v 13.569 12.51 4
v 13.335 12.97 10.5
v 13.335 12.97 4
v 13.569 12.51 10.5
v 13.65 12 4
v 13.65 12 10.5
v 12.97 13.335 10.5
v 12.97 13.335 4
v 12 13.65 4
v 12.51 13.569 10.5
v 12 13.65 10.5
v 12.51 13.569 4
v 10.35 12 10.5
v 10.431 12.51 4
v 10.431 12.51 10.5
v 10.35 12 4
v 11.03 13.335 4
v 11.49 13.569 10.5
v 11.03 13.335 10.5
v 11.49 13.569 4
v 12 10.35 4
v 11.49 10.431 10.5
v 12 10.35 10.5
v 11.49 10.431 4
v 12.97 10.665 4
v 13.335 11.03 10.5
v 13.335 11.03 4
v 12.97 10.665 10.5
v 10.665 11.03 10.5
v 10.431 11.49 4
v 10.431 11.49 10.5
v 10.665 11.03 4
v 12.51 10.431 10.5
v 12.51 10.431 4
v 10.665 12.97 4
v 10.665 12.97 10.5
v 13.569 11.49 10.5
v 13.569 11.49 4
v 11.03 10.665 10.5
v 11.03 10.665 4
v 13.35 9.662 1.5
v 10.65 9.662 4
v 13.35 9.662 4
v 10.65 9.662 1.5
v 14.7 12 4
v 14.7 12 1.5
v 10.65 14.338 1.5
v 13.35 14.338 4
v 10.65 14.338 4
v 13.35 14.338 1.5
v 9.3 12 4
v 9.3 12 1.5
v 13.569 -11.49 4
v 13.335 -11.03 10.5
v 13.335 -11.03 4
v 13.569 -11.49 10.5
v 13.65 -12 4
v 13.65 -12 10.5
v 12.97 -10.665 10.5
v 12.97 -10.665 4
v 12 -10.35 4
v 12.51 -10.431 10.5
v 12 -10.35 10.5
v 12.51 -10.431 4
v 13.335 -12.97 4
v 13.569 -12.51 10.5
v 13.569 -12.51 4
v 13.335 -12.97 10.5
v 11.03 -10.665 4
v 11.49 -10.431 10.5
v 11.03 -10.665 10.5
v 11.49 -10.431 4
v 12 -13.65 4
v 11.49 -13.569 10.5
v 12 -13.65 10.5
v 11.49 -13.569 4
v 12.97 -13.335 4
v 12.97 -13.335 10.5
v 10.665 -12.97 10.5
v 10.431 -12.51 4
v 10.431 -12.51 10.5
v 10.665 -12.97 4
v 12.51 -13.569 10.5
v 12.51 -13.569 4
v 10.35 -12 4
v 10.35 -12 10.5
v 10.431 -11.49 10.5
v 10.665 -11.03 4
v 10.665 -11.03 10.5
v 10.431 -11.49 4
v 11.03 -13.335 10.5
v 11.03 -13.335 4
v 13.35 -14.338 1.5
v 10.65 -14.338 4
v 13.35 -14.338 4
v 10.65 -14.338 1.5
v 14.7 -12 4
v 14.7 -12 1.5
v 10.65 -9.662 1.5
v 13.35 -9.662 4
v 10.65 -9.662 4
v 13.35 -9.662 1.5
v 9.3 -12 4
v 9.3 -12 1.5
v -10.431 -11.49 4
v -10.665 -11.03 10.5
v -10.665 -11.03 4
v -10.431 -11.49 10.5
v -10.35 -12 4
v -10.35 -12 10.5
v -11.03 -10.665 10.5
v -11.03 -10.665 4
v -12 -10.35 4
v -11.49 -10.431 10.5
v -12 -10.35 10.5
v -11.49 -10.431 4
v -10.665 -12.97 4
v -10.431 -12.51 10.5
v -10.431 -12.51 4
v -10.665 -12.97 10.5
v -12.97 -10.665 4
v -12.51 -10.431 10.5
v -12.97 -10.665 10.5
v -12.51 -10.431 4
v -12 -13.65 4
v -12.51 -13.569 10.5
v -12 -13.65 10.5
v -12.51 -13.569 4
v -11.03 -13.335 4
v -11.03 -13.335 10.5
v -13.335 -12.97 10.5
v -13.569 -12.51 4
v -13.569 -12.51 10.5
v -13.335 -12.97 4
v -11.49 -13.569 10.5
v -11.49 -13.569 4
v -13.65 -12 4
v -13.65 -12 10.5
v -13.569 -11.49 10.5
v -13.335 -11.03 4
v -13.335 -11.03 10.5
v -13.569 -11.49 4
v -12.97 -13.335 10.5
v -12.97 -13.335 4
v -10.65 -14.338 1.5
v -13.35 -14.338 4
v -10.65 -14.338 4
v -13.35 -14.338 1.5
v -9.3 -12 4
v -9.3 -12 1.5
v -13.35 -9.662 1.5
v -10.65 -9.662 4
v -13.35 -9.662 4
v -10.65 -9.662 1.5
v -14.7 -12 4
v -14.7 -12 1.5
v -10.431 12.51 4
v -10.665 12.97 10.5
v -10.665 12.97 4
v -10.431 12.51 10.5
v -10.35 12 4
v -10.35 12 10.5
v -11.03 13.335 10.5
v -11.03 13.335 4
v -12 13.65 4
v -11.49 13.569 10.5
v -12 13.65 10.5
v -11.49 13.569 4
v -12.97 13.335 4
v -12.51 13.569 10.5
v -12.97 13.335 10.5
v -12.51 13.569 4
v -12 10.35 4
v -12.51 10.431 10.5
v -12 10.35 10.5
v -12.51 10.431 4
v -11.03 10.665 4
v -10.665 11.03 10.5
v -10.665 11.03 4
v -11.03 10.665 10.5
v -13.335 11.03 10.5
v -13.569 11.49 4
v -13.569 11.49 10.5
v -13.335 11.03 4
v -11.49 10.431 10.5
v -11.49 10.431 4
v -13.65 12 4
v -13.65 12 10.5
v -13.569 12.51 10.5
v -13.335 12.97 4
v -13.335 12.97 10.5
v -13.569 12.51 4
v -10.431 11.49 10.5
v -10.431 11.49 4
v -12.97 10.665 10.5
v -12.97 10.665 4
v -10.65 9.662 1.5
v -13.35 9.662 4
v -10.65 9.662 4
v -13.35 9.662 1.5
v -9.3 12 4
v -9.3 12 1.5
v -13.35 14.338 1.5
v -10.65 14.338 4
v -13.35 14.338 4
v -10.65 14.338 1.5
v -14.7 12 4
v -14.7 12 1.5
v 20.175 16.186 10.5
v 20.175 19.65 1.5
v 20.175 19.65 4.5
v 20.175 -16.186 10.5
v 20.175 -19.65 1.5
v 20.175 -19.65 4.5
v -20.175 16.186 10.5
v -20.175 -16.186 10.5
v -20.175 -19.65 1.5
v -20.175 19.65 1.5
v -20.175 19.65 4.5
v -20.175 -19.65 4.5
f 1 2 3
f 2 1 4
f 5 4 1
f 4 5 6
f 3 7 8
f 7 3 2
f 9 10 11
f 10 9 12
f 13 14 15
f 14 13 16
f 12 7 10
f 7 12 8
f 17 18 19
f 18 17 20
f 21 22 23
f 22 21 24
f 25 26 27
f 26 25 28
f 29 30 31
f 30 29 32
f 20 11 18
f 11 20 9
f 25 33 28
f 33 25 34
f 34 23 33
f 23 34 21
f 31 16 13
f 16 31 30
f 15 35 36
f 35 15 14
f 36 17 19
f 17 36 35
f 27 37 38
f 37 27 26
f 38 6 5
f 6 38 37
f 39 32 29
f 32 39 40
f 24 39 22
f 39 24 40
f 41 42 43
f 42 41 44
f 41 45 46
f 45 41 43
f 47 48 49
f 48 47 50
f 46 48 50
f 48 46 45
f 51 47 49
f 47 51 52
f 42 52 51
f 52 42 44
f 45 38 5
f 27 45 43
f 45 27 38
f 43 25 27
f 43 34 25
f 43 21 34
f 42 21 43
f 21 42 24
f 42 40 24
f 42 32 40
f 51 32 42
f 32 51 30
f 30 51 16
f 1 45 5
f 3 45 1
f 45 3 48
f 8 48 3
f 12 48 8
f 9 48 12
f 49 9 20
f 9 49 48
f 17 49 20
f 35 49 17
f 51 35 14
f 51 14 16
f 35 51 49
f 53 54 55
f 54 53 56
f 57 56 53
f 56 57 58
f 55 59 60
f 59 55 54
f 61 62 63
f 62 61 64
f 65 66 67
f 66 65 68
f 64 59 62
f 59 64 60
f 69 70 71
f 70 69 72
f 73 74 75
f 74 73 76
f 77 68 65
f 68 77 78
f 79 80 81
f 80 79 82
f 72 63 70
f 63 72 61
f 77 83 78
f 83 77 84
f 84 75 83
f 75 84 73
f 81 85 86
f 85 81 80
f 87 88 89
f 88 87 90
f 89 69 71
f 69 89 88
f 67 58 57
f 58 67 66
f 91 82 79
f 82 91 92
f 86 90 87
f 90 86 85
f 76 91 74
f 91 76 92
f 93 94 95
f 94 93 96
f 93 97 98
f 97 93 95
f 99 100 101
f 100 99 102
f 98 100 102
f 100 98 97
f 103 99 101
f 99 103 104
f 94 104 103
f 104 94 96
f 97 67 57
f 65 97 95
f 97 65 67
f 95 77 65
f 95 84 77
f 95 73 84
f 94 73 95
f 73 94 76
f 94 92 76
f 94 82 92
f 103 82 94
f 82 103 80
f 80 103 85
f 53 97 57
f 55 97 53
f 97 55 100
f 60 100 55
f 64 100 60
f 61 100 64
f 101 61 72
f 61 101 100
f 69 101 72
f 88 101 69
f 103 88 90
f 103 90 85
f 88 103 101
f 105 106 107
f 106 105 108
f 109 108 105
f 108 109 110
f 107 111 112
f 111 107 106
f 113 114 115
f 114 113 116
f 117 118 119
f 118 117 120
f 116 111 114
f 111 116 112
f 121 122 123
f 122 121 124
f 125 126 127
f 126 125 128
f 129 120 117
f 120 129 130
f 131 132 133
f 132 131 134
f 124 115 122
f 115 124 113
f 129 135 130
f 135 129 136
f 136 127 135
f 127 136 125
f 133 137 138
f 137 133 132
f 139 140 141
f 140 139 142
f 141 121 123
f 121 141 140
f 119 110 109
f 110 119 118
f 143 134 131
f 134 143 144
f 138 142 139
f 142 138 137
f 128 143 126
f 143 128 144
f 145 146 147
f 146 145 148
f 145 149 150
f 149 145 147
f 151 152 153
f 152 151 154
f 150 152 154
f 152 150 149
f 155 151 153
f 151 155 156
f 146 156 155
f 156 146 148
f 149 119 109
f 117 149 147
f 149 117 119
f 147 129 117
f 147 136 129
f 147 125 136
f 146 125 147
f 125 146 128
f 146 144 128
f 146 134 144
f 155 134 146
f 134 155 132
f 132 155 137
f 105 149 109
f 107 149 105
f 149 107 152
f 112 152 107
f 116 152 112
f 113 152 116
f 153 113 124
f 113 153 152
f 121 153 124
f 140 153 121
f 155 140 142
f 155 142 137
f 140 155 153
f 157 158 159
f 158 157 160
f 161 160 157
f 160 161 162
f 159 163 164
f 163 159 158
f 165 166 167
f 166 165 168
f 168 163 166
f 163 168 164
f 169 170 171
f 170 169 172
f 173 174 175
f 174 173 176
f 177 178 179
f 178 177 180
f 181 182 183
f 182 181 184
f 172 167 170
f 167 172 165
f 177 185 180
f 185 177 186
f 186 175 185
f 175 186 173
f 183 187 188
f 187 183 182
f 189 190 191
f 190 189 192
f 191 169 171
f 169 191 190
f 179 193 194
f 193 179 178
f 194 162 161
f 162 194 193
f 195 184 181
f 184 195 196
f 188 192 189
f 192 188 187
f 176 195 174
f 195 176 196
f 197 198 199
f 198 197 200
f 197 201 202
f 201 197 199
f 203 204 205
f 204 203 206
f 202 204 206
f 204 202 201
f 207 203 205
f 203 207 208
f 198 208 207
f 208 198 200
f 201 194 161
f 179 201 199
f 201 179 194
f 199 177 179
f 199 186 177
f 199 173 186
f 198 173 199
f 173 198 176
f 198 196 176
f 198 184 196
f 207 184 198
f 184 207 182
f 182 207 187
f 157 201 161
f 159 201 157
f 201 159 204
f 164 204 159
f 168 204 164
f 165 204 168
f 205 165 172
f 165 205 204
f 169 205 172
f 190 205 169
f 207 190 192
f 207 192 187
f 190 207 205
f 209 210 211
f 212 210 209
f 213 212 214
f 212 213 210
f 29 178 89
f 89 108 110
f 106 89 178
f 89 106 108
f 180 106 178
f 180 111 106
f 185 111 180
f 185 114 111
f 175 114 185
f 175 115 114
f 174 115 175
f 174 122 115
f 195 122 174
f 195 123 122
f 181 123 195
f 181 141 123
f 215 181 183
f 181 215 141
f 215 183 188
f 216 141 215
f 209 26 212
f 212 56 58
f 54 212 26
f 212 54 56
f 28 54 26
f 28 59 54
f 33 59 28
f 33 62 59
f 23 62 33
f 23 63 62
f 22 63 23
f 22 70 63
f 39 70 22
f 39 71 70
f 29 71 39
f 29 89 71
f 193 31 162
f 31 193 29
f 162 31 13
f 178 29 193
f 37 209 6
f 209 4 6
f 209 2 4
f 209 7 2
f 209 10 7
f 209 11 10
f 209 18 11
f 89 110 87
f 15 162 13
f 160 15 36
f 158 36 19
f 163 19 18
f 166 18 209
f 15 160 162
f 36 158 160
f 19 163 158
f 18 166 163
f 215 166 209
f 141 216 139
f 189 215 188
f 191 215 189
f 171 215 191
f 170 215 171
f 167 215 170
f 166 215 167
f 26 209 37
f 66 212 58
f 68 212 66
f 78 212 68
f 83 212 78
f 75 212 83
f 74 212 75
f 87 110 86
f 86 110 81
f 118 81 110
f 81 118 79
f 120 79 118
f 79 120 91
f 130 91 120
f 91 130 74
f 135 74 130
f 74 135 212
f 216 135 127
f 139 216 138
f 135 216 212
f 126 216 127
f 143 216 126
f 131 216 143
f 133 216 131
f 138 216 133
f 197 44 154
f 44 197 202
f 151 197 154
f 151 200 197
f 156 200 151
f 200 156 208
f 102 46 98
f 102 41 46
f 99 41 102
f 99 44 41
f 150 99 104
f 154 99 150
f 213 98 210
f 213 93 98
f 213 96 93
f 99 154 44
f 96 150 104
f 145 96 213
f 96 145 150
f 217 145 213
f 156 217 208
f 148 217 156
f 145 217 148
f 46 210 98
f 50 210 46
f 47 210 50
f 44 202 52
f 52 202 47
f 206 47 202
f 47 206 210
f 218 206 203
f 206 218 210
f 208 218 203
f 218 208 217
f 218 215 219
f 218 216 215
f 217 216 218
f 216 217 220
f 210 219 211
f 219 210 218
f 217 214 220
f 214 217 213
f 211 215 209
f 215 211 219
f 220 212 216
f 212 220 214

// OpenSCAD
// https://www.thingiverse.com/thing:1729344/#files
// Dolica Tripod Quick Release Base by tdeagan is licensed under the Creative Commons - Attribution license. 

// Remix by Marc Poulhiès.

dim_x = 40.35;
dim_y = 39.3;
dim_y2 = 32.375;
dim_z = 3;
dim_z2 = 9;

hex_nut_diam = 1.8*3; // M3
screw_diam = 3.3; // M3

//translate([0,0,dim_z2-dim_z/2]){
//    color("green"){cube([dim_x+10,dim_y2,dim_z2-dim_z],true);}
//}

module screw_hole(x,y) {
            translate([x,y,-2]){
            #cylinder(h=30,d=screw_diam, center=true, $fn=20);
            #cylinder(h=3, d=hex_nut_diam, center=true, $fn=6);
        }
}

translate([0,0,dim_z2/2]){
    difference(){
        translate([0,0,dim_z2/2-dim_z]){
            cube([dim_x,dim_y,dim_z2],true);
        }
        
        translate([-(dim_x+4)/2,(dim_y/2),0]){
        rotate([30,0,0]){
            #cube([dim_x+4,10,10]);
        }}
        
        mirror([0,1,0]){
        translate([-(dim_x+4)/2,(dim_y/2),0]){
        rotate([30,0,0]){
            #cube([dim_x+4,10,10]);
        }}}
        
        screw_hole(12,12);
        screw_hole(12,-12);
        screw_hole(-12,-12);
        screw_hole(-12,12);

    }
}
